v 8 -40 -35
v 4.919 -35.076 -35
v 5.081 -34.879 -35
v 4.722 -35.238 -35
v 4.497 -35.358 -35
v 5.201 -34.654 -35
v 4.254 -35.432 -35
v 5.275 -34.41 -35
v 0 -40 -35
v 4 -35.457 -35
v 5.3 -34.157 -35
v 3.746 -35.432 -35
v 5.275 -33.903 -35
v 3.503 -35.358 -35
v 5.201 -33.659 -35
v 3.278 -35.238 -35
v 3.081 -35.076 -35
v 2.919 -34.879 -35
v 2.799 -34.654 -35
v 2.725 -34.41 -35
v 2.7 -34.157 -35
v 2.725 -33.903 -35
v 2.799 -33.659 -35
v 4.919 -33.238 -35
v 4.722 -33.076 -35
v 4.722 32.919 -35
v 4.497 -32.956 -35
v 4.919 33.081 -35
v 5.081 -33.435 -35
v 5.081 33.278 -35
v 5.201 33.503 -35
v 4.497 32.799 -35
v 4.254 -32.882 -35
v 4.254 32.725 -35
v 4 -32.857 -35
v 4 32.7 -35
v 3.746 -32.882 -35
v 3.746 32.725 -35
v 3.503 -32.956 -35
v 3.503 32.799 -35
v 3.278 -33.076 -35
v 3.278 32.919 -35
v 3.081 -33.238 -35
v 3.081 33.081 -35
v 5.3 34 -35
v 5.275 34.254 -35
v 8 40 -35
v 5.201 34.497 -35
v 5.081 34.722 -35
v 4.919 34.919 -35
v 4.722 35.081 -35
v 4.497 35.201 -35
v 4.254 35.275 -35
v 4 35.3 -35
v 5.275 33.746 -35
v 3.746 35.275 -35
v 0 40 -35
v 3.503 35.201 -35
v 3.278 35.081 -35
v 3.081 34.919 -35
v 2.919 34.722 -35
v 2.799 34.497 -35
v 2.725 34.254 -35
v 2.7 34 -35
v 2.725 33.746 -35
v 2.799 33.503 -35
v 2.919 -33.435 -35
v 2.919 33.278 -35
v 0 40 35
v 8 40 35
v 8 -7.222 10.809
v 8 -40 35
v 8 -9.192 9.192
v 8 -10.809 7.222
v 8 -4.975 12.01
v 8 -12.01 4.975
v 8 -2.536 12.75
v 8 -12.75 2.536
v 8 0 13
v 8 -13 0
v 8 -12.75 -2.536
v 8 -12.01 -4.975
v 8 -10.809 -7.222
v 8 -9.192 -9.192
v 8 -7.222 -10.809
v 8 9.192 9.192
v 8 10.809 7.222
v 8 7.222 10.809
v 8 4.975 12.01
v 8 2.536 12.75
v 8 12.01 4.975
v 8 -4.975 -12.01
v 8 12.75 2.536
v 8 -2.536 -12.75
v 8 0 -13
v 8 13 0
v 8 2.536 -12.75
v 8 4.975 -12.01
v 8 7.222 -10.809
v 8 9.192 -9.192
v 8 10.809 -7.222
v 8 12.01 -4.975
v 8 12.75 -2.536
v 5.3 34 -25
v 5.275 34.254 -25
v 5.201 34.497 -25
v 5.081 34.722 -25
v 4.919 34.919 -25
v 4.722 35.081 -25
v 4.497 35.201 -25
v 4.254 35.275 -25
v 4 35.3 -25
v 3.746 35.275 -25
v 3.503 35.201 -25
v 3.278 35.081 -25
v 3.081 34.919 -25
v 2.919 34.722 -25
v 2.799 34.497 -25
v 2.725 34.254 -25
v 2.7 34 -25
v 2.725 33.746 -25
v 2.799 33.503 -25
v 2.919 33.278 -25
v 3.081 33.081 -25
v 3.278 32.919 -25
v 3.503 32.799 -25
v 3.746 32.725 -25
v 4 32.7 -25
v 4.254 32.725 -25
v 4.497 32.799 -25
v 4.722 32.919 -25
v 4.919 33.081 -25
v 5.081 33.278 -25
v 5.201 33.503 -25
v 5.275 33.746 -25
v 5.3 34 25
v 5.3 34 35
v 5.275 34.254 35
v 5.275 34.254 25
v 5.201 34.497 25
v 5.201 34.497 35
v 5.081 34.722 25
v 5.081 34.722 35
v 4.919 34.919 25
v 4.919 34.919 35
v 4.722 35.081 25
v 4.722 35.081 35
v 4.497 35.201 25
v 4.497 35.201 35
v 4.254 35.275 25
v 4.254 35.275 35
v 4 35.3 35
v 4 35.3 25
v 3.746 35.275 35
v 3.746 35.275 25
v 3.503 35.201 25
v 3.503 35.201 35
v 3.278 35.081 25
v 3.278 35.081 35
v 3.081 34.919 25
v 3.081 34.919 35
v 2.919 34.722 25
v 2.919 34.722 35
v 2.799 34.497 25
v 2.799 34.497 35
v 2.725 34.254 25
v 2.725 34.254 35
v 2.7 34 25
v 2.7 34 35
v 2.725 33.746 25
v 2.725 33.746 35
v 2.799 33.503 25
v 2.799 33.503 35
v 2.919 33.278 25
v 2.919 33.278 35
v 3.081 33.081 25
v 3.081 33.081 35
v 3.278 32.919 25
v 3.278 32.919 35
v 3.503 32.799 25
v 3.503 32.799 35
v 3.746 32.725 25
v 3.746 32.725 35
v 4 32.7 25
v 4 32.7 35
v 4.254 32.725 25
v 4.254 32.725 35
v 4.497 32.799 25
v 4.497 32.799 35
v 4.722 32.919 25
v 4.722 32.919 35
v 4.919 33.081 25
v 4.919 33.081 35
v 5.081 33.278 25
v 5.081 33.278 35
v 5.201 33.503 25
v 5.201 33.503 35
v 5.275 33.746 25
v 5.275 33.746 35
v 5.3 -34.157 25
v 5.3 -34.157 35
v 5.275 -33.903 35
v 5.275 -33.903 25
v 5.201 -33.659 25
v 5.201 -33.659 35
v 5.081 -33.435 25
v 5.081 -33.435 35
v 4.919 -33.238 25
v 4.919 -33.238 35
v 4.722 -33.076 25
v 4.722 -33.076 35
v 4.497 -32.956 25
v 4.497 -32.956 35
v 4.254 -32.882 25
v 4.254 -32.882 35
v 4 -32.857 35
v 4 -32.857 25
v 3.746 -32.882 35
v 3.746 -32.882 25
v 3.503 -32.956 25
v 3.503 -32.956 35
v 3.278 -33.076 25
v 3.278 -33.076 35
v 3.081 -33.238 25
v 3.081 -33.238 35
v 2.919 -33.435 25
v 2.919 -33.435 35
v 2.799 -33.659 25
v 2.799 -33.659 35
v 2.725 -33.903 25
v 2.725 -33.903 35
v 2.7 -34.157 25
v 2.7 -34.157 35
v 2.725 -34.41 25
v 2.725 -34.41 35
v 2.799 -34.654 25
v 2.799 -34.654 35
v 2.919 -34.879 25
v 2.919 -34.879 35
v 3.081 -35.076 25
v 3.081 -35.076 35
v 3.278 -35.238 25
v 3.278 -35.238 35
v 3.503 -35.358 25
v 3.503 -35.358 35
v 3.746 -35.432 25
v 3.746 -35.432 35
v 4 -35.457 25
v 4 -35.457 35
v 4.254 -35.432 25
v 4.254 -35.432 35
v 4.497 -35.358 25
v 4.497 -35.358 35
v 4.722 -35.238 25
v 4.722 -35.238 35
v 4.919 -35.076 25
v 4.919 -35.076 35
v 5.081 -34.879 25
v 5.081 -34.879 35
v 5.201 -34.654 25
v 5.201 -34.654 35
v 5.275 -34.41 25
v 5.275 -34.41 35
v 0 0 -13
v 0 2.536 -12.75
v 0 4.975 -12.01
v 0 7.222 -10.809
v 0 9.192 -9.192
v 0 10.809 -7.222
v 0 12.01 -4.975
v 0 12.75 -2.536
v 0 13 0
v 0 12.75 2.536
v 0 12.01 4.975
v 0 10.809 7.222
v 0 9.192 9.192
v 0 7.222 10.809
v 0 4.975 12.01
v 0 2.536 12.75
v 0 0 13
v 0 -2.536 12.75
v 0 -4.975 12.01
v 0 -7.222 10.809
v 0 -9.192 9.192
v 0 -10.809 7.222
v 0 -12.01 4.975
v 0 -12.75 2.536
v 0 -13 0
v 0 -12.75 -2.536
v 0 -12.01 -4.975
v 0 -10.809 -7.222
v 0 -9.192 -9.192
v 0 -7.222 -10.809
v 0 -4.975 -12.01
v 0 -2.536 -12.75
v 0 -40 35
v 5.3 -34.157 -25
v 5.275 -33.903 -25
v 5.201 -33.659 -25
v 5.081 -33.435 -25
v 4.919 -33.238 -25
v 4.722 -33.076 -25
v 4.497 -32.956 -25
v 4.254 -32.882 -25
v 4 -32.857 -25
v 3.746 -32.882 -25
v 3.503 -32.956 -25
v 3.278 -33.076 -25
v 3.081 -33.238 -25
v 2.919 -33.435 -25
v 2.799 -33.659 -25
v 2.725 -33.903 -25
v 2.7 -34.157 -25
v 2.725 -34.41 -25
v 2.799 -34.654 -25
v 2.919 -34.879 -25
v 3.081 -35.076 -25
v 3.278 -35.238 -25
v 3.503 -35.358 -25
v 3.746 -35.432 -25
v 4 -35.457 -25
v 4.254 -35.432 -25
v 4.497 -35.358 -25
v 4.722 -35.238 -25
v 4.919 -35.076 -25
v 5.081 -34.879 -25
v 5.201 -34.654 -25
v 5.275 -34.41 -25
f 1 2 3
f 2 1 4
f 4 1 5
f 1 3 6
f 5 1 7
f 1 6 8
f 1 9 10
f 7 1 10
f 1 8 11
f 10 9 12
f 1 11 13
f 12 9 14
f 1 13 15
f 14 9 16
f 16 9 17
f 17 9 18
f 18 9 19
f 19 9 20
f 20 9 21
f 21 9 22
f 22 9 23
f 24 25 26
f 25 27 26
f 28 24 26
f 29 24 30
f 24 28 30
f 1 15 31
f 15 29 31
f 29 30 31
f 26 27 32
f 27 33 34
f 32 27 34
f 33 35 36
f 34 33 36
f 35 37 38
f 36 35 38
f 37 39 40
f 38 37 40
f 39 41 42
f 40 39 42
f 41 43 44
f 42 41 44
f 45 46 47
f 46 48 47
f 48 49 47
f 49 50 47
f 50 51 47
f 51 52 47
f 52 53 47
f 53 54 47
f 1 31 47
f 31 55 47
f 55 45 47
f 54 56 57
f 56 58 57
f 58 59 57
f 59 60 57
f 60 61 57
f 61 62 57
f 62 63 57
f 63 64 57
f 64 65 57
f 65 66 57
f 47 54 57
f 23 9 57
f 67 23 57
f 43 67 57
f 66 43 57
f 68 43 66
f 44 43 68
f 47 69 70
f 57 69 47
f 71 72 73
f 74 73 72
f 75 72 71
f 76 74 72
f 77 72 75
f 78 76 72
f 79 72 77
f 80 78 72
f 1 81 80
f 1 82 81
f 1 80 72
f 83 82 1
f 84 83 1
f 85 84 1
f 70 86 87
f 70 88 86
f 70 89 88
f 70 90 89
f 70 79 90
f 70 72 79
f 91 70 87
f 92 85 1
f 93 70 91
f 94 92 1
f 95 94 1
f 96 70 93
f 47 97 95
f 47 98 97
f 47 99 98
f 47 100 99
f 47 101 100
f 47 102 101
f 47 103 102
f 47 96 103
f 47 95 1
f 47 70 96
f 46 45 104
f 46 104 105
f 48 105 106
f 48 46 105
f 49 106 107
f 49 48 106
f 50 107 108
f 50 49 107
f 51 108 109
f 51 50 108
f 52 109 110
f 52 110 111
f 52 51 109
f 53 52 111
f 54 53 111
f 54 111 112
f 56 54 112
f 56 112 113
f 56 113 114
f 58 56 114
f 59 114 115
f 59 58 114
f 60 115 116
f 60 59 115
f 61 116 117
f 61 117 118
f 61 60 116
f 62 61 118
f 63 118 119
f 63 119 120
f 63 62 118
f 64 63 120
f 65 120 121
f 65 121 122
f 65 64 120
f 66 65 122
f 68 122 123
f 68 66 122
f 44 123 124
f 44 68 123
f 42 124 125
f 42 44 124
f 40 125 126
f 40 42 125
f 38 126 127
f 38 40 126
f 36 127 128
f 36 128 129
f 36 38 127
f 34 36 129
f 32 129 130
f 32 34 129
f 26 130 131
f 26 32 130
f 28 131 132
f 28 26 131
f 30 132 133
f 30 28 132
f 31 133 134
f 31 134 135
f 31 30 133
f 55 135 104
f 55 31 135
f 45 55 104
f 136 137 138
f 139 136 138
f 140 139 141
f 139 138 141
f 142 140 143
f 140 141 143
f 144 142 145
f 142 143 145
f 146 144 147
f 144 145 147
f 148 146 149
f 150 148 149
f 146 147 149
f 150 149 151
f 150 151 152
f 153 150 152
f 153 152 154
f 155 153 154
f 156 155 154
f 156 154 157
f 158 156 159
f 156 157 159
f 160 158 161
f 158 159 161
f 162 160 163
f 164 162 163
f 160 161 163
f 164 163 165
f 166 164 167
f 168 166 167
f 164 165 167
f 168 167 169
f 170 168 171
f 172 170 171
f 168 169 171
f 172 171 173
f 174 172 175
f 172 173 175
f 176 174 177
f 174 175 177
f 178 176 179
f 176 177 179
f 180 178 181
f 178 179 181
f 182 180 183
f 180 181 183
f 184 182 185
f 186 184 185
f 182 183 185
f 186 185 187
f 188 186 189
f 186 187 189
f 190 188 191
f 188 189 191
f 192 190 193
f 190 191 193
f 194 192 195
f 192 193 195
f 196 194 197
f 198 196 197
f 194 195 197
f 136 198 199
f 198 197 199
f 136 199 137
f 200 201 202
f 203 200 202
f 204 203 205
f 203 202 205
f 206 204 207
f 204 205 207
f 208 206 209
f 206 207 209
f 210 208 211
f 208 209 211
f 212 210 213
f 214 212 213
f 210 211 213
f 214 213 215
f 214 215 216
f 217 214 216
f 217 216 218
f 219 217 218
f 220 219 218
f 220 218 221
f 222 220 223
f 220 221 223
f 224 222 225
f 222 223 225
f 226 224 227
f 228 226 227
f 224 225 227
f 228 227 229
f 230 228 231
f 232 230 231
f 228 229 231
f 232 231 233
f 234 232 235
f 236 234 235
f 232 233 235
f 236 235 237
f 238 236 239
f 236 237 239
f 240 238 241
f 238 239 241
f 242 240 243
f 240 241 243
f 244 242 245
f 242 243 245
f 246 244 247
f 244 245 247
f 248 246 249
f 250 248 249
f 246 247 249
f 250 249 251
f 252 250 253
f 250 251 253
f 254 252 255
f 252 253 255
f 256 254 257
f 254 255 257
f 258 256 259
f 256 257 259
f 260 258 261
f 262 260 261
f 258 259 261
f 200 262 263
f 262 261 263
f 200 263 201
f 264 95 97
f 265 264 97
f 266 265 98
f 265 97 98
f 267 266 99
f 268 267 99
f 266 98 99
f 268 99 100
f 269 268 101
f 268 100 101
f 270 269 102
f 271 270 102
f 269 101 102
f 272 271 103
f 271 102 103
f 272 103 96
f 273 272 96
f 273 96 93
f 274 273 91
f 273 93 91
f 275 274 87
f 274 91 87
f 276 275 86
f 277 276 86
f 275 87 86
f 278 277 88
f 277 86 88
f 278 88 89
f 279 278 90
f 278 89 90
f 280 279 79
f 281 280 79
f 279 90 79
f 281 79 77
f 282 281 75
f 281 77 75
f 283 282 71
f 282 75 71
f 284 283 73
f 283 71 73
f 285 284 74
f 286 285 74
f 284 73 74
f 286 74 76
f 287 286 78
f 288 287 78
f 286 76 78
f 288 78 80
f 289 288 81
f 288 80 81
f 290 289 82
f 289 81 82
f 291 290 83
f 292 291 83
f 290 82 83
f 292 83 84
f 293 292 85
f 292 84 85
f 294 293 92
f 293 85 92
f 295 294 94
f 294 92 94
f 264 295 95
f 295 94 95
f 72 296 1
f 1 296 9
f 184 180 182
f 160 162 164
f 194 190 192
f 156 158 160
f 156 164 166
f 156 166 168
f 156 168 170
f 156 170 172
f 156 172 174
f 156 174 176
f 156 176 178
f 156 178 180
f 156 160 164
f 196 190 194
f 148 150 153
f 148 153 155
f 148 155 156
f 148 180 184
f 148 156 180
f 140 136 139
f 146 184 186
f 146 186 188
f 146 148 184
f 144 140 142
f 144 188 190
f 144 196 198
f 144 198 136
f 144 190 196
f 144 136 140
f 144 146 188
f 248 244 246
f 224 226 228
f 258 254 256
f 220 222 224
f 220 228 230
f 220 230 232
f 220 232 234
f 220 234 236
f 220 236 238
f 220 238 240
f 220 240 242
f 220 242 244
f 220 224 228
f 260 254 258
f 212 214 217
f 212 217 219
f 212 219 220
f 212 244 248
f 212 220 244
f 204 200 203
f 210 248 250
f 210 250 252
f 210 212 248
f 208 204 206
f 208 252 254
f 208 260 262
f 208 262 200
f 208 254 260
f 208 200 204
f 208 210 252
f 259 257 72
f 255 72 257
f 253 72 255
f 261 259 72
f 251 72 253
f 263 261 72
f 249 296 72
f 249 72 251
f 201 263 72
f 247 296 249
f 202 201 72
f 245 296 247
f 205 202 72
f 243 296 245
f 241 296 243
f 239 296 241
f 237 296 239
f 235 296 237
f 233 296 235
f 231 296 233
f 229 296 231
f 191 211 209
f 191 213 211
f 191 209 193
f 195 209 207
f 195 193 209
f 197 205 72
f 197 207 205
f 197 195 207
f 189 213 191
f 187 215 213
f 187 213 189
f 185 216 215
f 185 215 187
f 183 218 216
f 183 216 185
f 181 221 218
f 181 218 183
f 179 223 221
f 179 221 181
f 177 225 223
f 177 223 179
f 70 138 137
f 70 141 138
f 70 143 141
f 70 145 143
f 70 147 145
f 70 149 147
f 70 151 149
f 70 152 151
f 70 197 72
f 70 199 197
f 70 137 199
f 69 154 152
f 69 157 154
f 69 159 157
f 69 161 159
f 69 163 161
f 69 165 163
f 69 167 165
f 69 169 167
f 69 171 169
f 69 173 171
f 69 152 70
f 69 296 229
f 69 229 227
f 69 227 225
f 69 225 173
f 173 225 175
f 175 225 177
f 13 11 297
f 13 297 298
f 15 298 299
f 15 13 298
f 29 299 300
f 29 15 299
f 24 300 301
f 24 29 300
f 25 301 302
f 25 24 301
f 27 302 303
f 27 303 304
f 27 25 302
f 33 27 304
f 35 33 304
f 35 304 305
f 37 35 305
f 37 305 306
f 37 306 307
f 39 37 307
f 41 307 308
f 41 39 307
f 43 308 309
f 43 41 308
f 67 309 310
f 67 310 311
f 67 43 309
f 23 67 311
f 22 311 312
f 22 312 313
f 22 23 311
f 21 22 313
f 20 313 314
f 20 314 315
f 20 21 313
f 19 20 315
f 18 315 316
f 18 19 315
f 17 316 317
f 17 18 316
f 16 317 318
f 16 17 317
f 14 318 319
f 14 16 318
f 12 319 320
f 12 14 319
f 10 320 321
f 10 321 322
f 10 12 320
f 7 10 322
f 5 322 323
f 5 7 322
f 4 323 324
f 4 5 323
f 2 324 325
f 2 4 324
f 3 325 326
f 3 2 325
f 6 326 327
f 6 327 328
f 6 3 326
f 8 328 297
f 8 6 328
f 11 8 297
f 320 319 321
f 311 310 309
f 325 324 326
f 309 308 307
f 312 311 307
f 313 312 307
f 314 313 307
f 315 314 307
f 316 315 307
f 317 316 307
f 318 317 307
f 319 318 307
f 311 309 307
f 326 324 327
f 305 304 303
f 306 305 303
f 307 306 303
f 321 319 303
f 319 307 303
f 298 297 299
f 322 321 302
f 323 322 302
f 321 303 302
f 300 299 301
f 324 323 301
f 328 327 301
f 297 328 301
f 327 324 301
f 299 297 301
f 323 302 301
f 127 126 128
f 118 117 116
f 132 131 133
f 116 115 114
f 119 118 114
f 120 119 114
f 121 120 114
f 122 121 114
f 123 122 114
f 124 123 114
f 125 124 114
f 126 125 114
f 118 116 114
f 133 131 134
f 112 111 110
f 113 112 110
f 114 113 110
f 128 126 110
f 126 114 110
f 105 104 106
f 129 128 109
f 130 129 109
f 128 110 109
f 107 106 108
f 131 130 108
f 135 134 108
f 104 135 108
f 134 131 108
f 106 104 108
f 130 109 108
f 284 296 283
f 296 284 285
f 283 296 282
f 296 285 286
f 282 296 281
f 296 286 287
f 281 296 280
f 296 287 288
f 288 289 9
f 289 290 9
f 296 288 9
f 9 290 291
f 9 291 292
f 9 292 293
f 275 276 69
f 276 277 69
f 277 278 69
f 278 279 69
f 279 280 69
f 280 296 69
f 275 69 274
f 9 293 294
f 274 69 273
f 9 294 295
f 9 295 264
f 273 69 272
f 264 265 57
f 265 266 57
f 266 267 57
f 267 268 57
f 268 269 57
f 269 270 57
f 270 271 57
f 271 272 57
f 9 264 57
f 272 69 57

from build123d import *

# Parameters (mm, degrees)
SKETCH_1_W          = 70
SKETCH_1_H          = 80
EXTRUDE_1_DEPTH     = 8
SKETCH_4_R          = 13
CUT_EXTRUDE_2_DEPTH = 8
SKETCH_5_R          = 1.3
CUT_EXTRUDE_3_DEPTH = 10


with BuildPart() as part:
    # 草图1 → 凸台-拉伸1 (new body)
    with BuildSketch(Plane(origin=(0, 0, 0), x_dir=(0, 0, -1), z_dir=(1, 0, 0))):
        Rectangle(SKETCH_1_W, SKETCH_1_H)
    extrude(amount=EXTRUDE_1_DEPTH)

    # 草图4 → 切除-拉伸2 (cut)
    with BuildSketch(Plane(origin=(8, 0, 0), x_dir=(0, 0, -1), z_dir=(1, 0, 0))):
        Circle(SKETCH_4_R)
    extrude(amount=-CUT_EXTRUDE_2_DEPTH, mode=Mode.SUBTRACT)

    # 草图5 → 切除-拉伸3 (cut)
    with BuildSketch(Plane.XY.offset(35)):
        with Locations((4, 34)):
            Circle(SKETCH_5_R)
        with Locations((4, -34.156756408)):
            Circle(SKETCH_5_R)
    cut_extrude_3 = extrude(amount=-CUT_EXTRUDE_3_DEPTH, mode=Mode.SUBTRACT)

    # 镜向1: 切除-拉伸3 across plane
    add(cut_extrude_3.mirror(Plane.XY), mode=Mode.SUBTRACT)


solid = part.part
